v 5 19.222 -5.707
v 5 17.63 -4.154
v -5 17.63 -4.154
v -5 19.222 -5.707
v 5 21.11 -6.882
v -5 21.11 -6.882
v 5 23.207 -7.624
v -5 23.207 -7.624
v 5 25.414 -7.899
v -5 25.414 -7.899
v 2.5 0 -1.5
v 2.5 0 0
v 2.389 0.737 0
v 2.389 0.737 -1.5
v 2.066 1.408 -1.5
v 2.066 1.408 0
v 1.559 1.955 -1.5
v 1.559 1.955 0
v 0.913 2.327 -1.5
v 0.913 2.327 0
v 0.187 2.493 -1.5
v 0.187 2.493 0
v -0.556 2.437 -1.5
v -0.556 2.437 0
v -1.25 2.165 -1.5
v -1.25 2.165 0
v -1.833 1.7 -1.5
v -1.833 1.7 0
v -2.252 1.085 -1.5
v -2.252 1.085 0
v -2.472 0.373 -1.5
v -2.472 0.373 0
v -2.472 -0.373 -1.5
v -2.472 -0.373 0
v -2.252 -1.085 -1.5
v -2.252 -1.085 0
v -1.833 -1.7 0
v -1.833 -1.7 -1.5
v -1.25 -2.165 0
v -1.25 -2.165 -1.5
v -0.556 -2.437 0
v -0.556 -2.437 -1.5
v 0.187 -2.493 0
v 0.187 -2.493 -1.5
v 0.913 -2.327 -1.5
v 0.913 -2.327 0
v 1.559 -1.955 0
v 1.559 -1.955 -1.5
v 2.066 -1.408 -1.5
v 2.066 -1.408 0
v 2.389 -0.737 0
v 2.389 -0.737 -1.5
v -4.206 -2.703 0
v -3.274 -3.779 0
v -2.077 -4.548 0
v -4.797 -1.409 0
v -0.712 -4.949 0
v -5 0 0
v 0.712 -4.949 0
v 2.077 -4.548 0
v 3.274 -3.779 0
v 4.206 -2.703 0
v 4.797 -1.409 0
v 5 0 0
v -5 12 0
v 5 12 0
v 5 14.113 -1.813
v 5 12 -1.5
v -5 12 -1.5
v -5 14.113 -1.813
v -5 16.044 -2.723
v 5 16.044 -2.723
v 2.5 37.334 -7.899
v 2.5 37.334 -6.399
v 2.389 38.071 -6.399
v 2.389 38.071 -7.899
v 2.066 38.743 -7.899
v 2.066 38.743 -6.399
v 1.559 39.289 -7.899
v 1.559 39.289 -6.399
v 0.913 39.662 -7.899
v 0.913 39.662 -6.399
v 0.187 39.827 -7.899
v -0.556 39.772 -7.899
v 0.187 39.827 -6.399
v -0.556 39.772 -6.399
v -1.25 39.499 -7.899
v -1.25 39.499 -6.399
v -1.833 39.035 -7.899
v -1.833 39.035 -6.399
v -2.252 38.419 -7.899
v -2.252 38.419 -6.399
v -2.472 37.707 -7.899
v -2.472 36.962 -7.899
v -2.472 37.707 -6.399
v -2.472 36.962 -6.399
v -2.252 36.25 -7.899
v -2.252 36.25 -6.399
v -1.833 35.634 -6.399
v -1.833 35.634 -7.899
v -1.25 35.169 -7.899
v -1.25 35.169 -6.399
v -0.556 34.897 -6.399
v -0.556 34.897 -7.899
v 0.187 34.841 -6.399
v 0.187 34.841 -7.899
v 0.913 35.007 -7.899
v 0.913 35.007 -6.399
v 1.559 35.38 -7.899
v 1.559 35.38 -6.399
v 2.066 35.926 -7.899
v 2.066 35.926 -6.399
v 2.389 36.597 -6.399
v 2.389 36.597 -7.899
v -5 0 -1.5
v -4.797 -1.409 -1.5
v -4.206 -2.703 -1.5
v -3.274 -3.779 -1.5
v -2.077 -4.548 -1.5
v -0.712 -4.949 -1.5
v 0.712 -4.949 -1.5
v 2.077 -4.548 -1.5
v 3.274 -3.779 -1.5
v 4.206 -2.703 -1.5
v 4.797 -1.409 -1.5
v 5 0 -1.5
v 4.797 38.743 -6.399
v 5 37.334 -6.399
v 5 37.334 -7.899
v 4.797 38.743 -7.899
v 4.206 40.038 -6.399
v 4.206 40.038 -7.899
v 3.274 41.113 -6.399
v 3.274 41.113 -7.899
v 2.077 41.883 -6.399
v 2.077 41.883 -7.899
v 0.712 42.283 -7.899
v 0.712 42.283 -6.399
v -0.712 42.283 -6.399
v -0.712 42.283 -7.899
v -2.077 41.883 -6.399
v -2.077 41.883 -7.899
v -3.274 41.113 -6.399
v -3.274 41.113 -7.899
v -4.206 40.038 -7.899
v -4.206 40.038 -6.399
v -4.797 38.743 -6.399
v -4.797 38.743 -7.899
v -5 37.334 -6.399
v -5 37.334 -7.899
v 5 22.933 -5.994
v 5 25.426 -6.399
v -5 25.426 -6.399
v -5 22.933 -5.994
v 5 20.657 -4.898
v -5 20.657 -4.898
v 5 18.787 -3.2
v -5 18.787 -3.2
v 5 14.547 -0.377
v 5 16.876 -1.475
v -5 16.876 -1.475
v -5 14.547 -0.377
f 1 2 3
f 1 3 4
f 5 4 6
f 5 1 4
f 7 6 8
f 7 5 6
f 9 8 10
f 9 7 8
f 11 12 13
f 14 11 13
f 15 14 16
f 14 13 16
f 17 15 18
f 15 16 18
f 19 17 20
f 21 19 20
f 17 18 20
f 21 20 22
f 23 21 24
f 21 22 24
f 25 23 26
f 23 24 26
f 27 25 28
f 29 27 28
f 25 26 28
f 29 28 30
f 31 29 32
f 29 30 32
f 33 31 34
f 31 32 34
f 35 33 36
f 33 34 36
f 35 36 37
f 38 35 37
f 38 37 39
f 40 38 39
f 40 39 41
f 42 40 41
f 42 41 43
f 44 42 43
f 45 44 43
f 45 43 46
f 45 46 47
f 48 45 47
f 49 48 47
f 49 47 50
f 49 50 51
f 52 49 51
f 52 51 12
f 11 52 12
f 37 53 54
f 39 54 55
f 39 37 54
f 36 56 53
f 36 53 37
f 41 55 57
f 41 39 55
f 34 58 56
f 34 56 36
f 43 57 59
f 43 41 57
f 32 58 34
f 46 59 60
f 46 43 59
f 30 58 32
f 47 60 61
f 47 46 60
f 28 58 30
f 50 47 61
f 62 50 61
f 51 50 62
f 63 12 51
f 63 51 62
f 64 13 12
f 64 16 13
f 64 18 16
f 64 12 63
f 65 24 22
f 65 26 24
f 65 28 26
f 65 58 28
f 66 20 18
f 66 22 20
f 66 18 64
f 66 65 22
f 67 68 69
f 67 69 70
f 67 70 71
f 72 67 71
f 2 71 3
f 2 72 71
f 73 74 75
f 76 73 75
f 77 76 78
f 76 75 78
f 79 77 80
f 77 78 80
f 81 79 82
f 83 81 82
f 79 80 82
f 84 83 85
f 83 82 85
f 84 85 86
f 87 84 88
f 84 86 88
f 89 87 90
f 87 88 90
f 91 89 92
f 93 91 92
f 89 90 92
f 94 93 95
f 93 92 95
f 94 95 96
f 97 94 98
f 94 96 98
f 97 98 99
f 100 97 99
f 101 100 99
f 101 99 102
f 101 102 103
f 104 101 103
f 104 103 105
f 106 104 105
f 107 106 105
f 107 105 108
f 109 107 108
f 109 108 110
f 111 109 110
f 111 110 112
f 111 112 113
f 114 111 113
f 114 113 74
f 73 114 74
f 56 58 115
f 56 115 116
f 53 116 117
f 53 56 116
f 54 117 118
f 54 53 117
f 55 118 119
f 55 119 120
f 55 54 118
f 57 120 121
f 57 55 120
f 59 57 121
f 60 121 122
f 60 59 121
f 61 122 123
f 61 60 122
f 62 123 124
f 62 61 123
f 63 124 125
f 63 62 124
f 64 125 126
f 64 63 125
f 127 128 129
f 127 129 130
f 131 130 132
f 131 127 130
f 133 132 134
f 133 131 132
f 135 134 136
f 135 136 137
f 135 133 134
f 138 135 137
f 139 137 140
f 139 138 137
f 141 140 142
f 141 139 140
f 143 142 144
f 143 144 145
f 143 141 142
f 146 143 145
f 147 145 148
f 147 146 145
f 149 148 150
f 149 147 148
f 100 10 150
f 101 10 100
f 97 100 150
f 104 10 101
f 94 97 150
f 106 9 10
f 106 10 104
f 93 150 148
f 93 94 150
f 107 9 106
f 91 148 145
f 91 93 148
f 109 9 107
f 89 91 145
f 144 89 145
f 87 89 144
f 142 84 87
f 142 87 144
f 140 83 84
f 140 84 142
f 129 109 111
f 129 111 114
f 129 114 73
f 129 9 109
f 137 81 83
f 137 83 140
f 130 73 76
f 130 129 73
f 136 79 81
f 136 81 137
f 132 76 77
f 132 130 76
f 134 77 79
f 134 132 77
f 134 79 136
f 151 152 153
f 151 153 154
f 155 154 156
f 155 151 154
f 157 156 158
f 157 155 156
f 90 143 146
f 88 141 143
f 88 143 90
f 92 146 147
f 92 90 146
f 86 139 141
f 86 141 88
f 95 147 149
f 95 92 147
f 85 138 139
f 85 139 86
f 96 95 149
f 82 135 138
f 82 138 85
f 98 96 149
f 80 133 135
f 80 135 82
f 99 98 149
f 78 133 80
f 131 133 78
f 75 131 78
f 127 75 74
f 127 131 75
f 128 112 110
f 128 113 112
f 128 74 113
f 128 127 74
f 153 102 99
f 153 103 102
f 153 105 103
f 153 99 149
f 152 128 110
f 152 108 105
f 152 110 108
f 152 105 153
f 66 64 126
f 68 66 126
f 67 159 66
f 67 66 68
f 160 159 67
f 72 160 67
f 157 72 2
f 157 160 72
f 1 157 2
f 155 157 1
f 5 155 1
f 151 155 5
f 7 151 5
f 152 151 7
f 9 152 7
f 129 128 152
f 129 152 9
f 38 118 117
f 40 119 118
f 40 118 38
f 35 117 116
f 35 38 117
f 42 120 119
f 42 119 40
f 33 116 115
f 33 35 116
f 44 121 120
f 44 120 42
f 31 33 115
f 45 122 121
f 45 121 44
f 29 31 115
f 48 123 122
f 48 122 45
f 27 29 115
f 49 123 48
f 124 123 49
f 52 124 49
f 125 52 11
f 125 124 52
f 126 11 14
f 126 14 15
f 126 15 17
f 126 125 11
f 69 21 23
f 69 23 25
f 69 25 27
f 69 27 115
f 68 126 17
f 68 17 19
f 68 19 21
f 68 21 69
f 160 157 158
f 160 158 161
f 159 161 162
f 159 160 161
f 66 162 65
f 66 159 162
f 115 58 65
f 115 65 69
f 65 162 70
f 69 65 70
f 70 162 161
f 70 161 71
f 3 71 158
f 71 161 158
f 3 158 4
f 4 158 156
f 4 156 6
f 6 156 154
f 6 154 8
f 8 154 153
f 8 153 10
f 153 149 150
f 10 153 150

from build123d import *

# Parameters (mm, degrees)
BRACKET_BASE_DEPTH = 5
SKETCH7_R          = 5
RADIUS_1_DEPTH     = 1.5
SKETCH8_R          = 5
RADIUS_2_DEPTH     = 1.5
SKETCH9_R          = 2.5
HOLES_DEPTH        = 44.354217003


with BuildPart() as part:
    # Sketch4 → Bracket Base (new, symmetric)
    with BuildSketch(Plane(origin=(0, 0, 0), x_dir=(0, 0, -1), z_dir=(1, 0, 0))):
        with BuildLine():
            Line((1.5, 0), (1.5, 12))
            ThreePointArc((1.5, 12), (2.196870508, 15.112089987), (4.154386337, 17.629800131))
            ThreePointArc((4.154386337, 17.629800131), (6.88214507, 21.110113004), (7.898749765, 25.413572113))
            Line((7.898749765, 25.413572113), (7.898749765, 37.334358198))
            Line((7.898749765, 37.334358198), (6.398749765, 37.334358198))
            Line((6.398749765, 37.334358198), (6.398749765, 25.425719387))
            ThreePointArc((6.398749765, 25.425719387), (5.527978098, 21.755301891), (3.2, 18.787015202))
            ThreePointArc((3.2, 18.787015202), (0.840113436, 15.75178542), (0, 12))
            Line((0, 12), (0, 0))
            Line((0, 0), (1.5, 0))
        make_face()
    extrude(amount=BRACKET_BASE_DEPTH, both=True)

    # Sketch7 → Radius 1 (add)
    with BuildSketch(Plane.XY):
        Circle(SKETCH7_R)
    extrude(amount=-RADIUS_1_DEPTH)

    # Sketch8 → Radius 2 (add)
    with BuildSketch(Plane.XY.offset(-6.398749765)):
        with Locations((0, 37.334358198)):
            Circle(SKETCH8_R)
    extrude(amount=-RADIUS_2_DEPTH)

    # Sketch9 → Holes (cut, through all)
    with BuildSketch(Plane.XY):
        Circle(SKETCH9_R)
        with Locations((0, 37.334358198)):
            Circle(SKETCH9_R)
    extrude(amount=-HOLES_DEPTH, mode=Mode.SUBTRACT)


solid = part.part
